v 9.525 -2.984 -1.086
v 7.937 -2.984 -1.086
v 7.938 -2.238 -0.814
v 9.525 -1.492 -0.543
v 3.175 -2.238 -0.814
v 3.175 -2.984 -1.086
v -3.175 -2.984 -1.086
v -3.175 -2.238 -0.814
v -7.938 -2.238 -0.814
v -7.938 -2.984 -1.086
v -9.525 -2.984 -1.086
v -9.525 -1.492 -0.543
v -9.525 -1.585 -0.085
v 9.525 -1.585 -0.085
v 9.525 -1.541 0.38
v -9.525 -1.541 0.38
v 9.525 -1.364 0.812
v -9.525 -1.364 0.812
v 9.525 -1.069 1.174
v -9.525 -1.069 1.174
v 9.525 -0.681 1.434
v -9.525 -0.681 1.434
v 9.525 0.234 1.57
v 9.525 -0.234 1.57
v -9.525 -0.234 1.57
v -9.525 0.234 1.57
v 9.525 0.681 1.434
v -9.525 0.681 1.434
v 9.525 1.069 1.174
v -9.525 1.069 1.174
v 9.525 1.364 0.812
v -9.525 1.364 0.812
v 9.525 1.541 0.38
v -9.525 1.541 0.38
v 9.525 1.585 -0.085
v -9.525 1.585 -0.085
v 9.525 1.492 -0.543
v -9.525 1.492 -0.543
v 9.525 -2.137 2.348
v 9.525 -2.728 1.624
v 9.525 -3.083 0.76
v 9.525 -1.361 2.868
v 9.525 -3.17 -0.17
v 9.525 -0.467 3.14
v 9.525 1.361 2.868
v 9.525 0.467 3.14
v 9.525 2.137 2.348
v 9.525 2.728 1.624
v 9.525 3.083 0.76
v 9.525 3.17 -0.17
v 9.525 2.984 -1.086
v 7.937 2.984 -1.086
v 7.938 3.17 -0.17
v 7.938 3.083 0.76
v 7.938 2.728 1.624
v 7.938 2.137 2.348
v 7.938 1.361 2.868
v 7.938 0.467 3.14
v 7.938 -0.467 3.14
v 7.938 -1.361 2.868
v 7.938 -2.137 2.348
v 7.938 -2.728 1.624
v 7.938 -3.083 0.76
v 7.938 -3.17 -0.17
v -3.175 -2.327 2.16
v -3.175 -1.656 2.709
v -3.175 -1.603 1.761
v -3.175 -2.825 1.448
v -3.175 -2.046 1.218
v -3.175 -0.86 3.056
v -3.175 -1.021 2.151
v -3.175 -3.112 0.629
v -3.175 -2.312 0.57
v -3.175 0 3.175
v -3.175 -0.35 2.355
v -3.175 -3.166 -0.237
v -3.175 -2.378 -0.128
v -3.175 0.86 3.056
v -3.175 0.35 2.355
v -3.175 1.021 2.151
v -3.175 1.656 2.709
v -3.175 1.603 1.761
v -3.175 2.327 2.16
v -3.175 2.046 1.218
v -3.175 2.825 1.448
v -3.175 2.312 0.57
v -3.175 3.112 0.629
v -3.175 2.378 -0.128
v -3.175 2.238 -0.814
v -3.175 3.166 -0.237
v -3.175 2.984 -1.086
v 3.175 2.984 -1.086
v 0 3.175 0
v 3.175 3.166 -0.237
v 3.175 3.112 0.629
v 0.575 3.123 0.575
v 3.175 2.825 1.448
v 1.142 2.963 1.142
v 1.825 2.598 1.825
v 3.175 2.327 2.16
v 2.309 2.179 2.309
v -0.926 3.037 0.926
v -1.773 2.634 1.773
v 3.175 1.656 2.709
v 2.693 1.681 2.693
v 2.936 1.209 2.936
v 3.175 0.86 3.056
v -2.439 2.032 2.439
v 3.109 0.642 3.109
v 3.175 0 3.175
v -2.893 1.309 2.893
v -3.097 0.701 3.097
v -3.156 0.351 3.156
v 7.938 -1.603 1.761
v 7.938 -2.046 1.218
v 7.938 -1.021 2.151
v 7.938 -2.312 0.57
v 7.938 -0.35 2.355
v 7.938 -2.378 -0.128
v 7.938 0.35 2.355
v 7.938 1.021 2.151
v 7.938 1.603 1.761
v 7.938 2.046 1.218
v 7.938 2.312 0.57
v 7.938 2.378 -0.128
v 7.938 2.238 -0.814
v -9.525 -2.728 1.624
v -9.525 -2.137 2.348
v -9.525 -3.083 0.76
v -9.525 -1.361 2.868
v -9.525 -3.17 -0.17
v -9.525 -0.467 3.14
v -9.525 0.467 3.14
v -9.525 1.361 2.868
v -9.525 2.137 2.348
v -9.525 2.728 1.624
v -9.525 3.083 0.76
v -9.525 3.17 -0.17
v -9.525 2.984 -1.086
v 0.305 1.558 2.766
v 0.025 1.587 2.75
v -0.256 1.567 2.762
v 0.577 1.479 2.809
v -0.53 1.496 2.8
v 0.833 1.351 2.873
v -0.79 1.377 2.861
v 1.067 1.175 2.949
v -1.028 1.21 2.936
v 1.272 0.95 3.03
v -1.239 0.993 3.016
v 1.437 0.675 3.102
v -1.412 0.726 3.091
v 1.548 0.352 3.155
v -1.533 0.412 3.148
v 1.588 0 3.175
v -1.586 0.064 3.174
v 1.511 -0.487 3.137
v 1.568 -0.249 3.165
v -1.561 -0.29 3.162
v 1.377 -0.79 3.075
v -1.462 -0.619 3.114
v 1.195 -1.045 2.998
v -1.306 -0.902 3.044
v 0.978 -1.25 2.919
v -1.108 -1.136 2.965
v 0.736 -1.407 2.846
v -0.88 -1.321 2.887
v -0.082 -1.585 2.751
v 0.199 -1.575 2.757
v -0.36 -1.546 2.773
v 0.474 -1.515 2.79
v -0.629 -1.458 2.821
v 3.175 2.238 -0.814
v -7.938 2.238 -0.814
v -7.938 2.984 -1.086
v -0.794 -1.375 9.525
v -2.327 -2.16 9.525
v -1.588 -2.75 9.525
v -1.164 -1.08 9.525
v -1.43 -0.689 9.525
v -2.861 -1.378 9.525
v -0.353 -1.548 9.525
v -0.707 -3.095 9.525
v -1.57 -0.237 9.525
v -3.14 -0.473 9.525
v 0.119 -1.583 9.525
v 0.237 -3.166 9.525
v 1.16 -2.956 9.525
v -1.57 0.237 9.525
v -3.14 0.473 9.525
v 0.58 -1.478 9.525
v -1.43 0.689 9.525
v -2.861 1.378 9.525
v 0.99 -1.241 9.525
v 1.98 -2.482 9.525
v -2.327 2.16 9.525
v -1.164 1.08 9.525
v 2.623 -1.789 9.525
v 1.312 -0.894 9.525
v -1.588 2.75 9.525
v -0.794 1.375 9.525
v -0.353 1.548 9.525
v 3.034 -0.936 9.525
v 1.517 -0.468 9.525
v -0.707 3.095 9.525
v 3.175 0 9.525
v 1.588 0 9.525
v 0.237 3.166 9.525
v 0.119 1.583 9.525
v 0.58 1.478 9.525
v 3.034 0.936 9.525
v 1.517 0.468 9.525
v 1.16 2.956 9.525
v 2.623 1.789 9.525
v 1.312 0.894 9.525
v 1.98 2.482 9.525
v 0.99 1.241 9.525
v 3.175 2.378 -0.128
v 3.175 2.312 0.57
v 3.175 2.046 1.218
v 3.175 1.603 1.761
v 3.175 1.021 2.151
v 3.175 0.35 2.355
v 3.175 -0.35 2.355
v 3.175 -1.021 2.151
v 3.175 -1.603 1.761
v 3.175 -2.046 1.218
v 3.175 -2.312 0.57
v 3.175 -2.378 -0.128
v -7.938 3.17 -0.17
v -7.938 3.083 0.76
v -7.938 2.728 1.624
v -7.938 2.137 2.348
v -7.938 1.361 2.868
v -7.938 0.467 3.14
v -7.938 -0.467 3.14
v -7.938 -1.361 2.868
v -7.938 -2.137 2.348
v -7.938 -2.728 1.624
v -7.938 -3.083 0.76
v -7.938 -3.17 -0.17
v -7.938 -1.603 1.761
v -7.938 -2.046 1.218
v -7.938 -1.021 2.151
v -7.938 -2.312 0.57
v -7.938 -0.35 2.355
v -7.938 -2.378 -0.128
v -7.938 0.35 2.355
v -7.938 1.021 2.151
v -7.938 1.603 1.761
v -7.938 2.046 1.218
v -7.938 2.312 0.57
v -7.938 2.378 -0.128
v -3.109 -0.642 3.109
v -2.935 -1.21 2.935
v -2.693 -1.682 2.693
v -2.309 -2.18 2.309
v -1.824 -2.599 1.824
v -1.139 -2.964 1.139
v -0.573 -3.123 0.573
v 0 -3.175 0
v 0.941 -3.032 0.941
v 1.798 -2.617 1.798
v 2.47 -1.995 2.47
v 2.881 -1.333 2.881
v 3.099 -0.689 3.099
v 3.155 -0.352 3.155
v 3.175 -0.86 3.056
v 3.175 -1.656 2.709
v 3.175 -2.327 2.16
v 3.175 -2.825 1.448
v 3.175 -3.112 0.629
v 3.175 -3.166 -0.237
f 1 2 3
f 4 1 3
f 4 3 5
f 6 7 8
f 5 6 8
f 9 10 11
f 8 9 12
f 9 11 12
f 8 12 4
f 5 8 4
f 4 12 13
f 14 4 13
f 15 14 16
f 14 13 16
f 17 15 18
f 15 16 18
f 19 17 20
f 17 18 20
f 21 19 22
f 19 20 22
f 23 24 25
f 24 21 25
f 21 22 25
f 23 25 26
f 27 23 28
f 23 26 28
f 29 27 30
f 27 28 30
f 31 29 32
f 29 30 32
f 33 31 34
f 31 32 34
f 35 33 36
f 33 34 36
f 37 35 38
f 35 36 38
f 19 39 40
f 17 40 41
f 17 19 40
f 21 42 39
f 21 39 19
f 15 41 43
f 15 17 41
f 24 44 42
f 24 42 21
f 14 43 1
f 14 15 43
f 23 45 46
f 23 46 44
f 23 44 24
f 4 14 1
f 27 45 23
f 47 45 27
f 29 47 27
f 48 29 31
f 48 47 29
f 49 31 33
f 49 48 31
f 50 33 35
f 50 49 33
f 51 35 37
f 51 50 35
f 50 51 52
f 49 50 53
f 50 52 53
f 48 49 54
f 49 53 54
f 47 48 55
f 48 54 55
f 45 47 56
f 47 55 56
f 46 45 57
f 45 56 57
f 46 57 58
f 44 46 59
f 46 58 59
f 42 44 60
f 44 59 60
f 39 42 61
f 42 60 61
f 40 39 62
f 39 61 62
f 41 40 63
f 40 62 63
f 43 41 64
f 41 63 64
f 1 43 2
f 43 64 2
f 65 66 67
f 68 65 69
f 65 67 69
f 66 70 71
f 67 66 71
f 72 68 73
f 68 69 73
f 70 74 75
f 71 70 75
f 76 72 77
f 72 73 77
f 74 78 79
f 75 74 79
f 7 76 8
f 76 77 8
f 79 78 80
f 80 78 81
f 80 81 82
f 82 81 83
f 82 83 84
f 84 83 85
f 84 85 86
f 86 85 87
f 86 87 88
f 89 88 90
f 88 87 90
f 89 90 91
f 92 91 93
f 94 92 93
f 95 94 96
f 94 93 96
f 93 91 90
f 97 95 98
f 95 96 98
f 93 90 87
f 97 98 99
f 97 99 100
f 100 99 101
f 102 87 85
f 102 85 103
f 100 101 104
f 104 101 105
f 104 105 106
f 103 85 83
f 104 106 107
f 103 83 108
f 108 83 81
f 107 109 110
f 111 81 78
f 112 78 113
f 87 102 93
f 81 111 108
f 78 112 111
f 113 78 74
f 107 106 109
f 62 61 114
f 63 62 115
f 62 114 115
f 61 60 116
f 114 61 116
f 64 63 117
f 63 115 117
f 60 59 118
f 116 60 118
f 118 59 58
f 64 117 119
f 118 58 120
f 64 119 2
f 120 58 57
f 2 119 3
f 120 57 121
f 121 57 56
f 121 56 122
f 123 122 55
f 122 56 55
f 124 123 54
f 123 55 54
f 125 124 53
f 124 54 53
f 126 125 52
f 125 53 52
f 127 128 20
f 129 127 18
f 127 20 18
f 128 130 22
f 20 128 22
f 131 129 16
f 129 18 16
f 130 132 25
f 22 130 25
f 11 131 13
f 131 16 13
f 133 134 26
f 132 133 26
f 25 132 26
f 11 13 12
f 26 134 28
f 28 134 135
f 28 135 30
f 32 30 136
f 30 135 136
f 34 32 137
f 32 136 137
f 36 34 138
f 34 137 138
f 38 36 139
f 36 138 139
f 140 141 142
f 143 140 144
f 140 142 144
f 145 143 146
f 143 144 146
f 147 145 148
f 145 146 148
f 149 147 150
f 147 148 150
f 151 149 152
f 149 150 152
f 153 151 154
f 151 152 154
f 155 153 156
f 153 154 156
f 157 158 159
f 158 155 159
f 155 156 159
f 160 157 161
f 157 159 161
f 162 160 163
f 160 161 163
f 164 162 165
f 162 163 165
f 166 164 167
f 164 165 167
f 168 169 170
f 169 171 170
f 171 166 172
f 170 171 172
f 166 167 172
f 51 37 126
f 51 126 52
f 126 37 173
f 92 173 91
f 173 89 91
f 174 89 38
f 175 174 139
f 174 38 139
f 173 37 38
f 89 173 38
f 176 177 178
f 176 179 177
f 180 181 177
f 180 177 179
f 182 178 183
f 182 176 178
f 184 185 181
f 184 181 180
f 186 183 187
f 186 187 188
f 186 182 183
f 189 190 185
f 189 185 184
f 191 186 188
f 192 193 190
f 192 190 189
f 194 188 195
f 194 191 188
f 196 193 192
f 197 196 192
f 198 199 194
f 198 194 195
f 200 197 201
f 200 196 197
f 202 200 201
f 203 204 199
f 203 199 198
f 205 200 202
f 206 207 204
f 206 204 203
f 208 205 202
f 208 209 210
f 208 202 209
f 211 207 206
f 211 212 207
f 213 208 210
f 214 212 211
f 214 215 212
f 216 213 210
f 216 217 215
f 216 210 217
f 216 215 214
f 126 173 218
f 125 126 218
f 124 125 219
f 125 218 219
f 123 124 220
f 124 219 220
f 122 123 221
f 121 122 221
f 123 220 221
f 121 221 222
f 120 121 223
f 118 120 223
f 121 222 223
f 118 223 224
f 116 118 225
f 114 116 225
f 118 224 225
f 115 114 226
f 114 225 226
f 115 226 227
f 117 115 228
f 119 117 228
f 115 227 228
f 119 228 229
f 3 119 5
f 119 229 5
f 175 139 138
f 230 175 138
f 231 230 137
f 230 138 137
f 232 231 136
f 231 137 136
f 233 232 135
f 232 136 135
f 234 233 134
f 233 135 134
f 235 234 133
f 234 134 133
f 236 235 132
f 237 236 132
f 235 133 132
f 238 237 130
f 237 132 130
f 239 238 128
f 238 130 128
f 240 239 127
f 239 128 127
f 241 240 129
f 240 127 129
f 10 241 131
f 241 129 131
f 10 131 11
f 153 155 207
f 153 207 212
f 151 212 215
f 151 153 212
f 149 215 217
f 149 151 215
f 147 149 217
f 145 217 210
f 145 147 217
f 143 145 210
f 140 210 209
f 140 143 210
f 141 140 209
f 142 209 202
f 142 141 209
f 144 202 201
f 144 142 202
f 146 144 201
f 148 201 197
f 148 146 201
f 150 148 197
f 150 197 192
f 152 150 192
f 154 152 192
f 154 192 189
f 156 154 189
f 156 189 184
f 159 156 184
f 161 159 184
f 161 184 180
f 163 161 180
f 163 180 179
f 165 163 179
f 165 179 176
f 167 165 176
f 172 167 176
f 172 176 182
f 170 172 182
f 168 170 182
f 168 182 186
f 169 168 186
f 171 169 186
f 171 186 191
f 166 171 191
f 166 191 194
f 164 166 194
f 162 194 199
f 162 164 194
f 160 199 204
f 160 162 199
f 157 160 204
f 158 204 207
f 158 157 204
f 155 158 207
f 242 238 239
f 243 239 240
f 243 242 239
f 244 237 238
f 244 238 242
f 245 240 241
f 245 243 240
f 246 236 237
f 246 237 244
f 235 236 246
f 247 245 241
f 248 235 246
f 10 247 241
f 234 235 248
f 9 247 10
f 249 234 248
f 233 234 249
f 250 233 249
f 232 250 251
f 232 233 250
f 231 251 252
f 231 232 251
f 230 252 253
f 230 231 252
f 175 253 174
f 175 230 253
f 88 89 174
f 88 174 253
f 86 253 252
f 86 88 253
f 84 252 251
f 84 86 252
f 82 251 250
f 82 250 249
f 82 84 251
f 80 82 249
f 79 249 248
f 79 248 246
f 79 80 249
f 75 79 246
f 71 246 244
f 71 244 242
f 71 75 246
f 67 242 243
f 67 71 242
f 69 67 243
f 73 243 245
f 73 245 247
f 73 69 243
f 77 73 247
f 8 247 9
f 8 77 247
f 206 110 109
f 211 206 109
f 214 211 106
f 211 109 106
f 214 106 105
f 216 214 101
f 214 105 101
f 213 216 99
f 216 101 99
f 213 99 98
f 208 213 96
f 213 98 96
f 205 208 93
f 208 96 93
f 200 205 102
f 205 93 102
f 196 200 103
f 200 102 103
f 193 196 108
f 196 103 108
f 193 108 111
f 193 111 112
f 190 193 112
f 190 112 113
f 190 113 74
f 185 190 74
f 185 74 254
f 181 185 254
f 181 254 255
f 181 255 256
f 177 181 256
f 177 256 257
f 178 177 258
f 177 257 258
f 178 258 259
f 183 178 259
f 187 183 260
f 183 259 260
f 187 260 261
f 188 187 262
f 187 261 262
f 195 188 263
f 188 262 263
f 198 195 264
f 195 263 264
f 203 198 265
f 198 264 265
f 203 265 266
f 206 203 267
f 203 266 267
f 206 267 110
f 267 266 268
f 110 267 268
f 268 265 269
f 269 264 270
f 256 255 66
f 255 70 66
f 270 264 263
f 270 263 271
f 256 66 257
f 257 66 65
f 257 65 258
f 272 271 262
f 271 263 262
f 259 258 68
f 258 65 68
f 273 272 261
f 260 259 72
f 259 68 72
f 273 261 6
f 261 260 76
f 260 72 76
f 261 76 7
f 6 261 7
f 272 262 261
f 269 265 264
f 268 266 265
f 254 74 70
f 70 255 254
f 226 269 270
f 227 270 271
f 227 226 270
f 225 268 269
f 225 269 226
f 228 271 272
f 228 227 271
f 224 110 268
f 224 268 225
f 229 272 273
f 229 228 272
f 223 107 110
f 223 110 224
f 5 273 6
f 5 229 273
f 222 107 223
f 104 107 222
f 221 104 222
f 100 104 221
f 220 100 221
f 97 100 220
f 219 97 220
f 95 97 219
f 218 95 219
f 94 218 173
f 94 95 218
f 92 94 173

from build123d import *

# Parameters (mm, degrees)
SKETCH1_R           = 3.175
SKETCH1_R_2         = 1.5875
BOSS_EXTRUDE1_DEPTH = 9.525
BOSS_EXTRUDE2_DEPTH = 19.05
SKETCH4_R           = 1.5875
CUT_EXTRUDE1_DEPTH  = 22.533897829
CUT_EXTRUDE2_START  = -7.9375
SKETCH5_R           = 3.175
SKETCH5_R_2         = 2.38125
CUT_EXTRUDE2_DEPTH  = 4.7625


with BuildPart() as part:
    # Sketch1 → Boss-Extrude1 (new body)
    with BuildSketch(Plane.XY):
        Circle(SKETCH1_R)
        Circle(SKETCH1_R_2, mode=Mode.SUBTRACT)
    extrude(amount=BOSS_EXTRUDE1_DEPTH)

    # Sketch3 → Boss-Extrude2 (add)
    with BuildSketch(Plane.ZY.offset(9.525)):
        with BuildLine():
            Line((-1.085913955, -2.983524071), (-0.542956978, -1.491762035))
            ThreePointArc((-0.542956978, -1.491762035), (1.5875, 0), (-0.542956978, 1.491762035))
            Line((-0.542956978, 1.491762035), (-1.085913955, 2.983524071))
            ThreePointArc((-1.085913955, 2.983524071), (3.175, 0), (-1.085913955, -2.983524071))
        make_face()
    extrude(amount=-BOSS_EXTRUDE2_DEPTH)

    # Sketch4 → Cut-Extrude1 (cut, through all)
    with BuildSketch(Plane.ZY.offset(9.525)):
        Circle(SKETCH4_R)
    extrude(amount=-CUT_EXTRUDE1_DEPTH, mode=Mode.SUBTRACT)

    # Sketch5 → Cut-Extrude2 (cut)
    with BuildSketch(Plane(origin=(0, 0, 0), x_dir=(0, 0, -1), z_dir=(1, 0, 0)).offset(CUT_EXTRUDE2_START)):
        Circle(SKETCH5_R)
        Circle(SKETCH5_R_2, mode=Mode.SUBTRACT)
    cut_extrude2 = extrude(amount=CUT_EXTRUDE2_DEPTH, mode=Mode.SUBTRACT)

    # Mirror1: Cut-Extrude2 across plane
    add(cut_extrude2.mirror(Plane(origin=(0, 0, 0), x_dir=(0, 0, 1), z_dir=(1, 0, 0))), mode=Mode.SUBTRACT)


solid = part.part
